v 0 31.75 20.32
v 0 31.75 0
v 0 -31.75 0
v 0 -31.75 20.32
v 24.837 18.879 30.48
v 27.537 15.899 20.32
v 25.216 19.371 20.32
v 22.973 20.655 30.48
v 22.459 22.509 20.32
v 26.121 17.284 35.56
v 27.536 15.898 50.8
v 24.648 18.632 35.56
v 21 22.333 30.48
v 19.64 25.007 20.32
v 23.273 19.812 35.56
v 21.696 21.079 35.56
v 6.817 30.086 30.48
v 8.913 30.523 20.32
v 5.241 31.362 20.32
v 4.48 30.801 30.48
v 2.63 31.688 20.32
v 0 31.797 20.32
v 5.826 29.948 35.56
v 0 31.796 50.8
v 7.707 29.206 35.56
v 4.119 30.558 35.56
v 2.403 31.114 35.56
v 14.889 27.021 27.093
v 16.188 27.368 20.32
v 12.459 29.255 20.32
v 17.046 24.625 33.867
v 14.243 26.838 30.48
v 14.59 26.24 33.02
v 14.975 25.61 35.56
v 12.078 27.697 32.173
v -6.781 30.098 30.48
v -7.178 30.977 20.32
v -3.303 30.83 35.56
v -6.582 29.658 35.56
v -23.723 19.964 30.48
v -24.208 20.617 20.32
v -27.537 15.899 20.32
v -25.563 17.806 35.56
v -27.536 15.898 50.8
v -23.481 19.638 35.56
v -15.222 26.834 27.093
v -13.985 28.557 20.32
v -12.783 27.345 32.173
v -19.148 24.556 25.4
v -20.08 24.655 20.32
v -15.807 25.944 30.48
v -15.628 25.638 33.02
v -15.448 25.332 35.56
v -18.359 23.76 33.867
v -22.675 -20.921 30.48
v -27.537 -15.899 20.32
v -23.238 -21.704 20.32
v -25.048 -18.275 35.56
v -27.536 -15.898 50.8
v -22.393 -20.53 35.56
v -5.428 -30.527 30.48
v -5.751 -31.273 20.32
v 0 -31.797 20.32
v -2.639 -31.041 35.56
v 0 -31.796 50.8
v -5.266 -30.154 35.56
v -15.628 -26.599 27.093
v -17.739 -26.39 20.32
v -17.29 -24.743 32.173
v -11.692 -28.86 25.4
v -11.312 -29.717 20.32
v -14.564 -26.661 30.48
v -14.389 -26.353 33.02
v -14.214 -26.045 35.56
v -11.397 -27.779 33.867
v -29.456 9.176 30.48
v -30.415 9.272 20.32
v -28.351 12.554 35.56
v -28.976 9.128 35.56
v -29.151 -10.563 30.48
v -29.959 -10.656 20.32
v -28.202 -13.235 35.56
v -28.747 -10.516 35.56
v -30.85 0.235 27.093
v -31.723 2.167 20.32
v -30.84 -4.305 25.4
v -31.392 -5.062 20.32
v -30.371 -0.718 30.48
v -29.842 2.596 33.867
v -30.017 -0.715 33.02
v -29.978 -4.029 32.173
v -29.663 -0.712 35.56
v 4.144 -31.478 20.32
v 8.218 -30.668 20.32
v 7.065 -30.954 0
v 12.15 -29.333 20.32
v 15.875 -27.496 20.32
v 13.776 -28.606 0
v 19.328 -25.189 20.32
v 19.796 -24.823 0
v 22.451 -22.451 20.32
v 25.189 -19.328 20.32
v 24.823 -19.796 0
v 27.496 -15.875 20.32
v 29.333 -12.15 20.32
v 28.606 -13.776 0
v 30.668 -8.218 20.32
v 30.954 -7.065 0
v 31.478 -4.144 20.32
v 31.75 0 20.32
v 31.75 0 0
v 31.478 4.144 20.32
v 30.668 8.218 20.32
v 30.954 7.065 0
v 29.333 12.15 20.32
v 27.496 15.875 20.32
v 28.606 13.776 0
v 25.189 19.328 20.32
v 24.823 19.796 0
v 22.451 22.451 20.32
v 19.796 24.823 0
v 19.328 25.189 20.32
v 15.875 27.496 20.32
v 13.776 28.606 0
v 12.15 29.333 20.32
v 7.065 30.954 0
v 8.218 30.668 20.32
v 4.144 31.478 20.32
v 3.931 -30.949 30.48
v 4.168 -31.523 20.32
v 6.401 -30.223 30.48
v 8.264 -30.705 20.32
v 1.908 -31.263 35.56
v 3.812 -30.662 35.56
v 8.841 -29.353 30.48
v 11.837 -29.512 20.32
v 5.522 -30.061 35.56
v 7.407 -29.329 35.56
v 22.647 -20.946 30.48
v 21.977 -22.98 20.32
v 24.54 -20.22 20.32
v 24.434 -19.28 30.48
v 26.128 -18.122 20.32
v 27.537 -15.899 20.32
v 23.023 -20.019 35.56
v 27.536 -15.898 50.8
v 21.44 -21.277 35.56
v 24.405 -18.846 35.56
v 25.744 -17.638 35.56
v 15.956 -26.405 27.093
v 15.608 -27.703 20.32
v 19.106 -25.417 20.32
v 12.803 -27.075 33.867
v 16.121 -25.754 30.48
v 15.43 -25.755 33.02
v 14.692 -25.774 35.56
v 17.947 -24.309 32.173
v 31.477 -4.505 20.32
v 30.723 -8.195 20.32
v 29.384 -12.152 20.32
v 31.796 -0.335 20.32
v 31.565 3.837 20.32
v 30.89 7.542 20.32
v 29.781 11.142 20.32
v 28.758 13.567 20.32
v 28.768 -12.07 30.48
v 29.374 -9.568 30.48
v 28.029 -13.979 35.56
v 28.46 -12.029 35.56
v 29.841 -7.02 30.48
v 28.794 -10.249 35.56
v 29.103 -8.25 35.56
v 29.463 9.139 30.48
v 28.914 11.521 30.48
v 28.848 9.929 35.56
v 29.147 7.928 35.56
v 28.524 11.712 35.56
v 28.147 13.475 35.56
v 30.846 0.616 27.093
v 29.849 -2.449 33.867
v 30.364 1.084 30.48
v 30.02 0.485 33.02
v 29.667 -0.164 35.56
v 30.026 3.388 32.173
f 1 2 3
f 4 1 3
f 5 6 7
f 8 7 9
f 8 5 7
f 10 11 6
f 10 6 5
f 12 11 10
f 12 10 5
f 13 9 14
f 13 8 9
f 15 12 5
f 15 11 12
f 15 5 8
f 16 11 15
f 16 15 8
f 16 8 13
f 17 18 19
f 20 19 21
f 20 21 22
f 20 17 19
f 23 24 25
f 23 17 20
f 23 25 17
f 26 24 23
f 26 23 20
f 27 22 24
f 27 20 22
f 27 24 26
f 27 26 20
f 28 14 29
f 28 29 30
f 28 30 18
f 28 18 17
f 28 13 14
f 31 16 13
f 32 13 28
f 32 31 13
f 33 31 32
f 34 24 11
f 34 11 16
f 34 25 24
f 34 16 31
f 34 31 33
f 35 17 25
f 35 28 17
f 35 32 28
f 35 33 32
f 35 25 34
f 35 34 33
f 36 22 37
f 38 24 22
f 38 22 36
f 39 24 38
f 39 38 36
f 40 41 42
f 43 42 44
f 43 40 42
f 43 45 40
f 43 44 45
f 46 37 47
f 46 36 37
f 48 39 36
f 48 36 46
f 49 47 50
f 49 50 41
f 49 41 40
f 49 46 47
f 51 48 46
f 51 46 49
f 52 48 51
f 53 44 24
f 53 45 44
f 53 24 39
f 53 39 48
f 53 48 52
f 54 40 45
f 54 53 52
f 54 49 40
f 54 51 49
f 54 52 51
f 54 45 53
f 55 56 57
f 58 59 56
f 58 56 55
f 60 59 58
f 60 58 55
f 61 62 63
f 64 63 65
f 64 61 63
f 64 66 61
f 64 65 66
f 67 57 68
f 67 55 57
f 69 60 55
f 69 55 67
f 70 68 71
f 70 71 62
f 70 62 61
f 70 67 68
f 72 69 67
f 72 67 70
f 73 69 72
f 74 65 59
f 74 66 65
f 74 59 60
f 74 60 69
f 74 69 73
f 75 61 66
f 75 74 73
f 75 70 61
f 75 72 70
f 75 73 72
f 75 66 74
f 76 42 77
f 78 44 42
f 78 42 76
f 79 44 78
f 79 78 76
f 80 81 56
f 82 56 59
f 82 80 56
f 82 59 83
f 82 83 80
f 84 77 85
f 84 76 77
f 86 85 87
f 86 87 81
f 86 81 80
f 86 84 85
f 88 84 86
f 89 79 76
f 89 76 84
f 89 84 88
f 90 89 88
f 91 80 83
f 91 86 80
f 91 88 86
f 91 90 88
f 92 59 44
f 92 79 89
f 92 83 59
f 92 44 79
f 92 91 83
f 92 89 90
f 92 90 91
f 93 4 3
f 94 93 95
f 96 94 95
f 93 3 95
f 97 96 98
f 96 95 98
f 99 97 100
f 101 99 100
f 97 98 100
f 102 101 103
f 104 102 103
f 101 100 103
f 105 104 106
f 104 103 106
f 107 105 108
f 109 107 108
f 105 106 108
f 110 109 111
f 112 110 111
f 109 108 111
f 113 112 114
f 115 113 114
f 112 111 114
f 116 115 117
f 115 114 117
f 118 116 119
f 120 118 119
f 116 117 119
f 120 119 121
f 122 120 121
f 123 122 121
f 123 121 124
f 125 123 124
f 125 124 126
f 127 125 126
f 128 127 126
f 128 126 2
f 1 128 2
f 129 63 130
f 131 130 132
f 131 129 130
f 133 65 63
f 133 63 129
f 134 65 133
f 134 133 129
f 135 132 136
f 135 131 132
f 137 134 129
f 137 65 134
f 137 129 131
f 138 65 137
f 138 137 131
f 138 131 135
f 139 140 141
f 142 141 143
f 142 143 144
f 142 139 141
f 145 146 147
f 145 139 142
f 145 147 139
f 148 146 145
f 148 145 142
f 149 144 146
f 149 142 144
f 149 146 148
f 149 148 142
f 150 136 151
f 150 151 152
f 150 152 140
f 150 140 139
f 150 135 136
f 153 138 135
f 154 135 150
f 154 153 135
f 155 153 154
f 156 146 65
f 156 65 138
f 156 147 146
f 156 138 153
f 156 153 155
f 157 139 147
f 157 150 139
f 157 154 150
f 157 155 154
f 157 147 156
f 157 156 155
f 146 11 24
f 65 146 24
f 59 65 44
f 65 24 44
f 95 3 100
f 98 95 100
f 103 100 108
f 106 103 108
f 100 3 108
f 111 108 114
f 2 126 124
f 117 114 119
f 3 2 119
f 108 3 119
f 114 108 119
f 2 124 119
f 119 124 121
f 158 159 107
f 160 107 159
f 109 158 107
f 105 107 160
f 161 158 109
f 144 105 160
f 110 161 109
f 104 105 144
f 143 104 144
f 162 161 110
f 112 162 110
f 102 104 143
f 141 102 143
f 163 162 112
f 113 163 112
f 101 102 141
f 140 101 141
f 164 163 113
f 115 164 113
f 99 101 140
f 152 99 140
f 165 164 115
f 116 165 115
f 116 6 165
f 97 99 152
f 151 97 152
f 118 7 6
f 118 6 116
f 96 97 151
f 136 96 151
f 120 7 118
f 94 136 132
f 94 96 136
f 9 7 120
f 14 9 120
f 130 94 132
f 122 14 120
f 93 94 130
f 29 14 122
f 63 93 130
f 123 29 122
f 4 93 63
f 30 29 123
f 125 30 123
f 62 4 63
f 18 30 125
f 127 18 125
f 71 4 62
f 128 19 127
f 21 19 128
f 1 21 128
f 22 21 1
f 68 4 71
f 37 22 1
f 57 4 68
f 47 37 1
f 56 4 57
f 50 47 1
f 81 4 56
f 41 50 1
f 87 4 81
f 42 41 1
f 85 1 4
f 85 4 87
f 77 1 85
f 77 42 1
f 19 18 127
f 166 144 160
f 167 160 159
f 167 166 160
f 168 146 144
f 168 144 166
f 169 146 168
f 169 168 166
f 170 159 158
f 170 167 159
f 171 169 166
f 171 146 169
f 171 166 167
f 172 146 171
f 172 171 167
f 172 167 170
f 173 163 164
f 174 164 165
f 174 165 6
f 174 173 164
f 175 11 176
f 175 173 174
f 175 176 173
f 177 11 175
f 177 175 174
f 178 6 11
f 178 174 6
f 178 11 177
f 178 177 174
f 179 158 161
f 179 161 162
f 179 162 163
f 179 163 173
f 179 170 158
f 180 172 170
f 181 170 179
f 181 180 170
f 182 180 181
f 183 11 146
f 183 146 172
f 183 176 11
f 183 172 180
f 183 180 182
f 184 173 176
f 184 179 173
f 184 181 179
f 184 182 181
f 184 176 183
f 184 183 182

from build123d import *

# Parameters (mm, degrees)
F1_DEPTH = 20.32


# Not quite as in the source:
# - the arcs of a loft's sections are written as splines that run evenly, so that the points pair up as in the source's solid
# - a feature names something its author has since deleted; it is built from what else it names


with BuildPart() as f1:
    # F0 (on Top) → F1 (new body)
    with BuildSketch(Plane.XY):
        with BuildLine():
            ThreePointArc((0, -31.75), (31.75, 0), (0, 31.75))
            Line((0, 31.75), (0, -31.75))
        make_face()
    extrude(amount=F1_DEPTH)

    # F4 (on offset) → F6 section 0
    with BuildSketch(Plane.XY.offset(20.32)):
        with BuildLine():
            add(Edge.make_bspline(
                [(0, 31.7974612136), (-1.8499013065, 31.7974612136), (-3.6997740452, 31.63561832), (-7.3433683431, 30.9931543385), (-9.1370336348, 30.5125431721), (-12.6137108486, 29.2471361521), (-14.2966690809, 28.4623598401), (-17.5007921327, 26.6124585335), (-19.0219074714, 25.5473621069), (-21.8561207037, 23.169174829), (-23.169174829, 21.8561207037), (-25.5473621069, 19.0219074714), (-26.6124585335, 17.5007921327), (-27.5374091868, 15.8987306068)],
                knots=[0, 0, 0, 0, 0.1666666667, 0.1666666667, 0.3333333333, 0.3333333333, 0.5, 0.5, 0.6666666667, 0.6666666667, 0.8333333333, 0.8333333333, 1, 1, 1, 1], degree=3))
            add(Edge.make_bspline(
                [(-27.5374091868, 15.8987306068), (-28.4623598401, 14.2966690809), (-29.2471361521, 12.6137108486), (-30.5125431721, 9.1370336348), (-30.9931543385, 7.3433683431), (-31.63561832, 3.6997740452), (-31.7974612136, 1.8499013065), (-31.7974612136, -1.8499013065), (-31.63561832, -3.6997740452), (-30.9931543385, -7.3433683431), (-30.5125431721, -9.1370336348), (-29.2471361521, -12.6137108486), (-28.4623598401, -14.2966690809), (-27.5374091868, -15.8987306068)],
                knots=[0, 0, 0, 0, 0.1666666667, 0.1666666667, 0.3333333333, 0.3333333333, 0.5, 0.5, 0.6666666667, 0.6666666667, 0.8333333333, 0.8333333333, 1, 1, 1, 1], degree=3))
            add(Edge.make_bspline(
                [(-27.5374091868, -15.8987306068), (-26.6124585335, -17.5007921327), (-25.5473621069, -19.0219074714), (-23.169174829, -21.8561207037), (-21.8561207037, -23.169174829), (-19.0219074714, -25.5473621069), (-17.5007921327, -26.6124585335), (-14.2966690809, -28.4623598401), (-12.6137108486, -29.2471361521), (-9.1370336348, -30.5125431721), (-7.3433683431, -30.9931543385), (-3.6997740452, -31.63561832), (-1.8499013065, -31.7974612136), (0, -31.7974612136)],
                knots=[0, 0, 0, 0, 0.1666666667, 0.1666666667, 0.3333333333, 0.3333333333, 0.5, 0.5, 0.6666666667, 0.6666666667, 0.8333333333, 0.8333333333, 1, 1, 1, 1], degree=3))
            add(Edge.make_bspline(
                [(0, -31.7974612136), (1.8499013065, -31.7974612136), (3.6997740452, -31.63561832), (7.3433683431, -30.9931543385), (9.1370336348, -30.5125431721), (12.6137108486, -29.2471361521), (14.2966690809, -28.4623598401), (17.5007921327, -26.6124585335), (19.0219074714, -25.5473621069), (21.8561207037, -23.169174829), (23.169174829, -21.8561207037), (25.5473621069, -19.0219074714), (26.6124585335, -17.5007921327), (27.5374091868, -15.8987306068)],
                knots=[0, 0, 0, 0, 0.1666666667, 0.1666666667, 0.3333333333, 0.3333333333, 0.5, 0.5, 0.6666666667, 0.6666666667, 0.8333333333, 0.8333333333, 1, 1, 1, 1], degree=3))
            add(Edge.make_bspline(
                [(27.5374091868, -15.8987306068), (28.4623598401, -14.2966690809), (29.2471361521, -12.6137108486), (30.5125431721, -9.1370336348), (30.9931543385, -7.3433683431), (31.63561832, -3.6997740452), (31.7974612136, -1.8499013065), (31.7974612136, 1.8499013065), (31.63561832, 3.6997740452), (30.9931543385, 7.3433683431), (30.5125431721, 9.1370336348), (29.2471361521, 12.6137108486), (28.4623598401, 14.2966690809), (27.5374091868, 15.8987306068)],
                knots=[0, 0, 0, 0, 0.1666666667, 0.1666666667, 0.3333333333, 0.3333333333, 0.5, 0.5, 0.6666666667, 0.6666666667, 0.8333333333, 0.8333333333, 1, 1, 1, 1], degree=3))
            add(Edge.make_bspline(
                [(27.5374091868, 15.8987306068), (26.6124585335, 17.5007921327), (25.5473621069, 19.0219074714), (23.169174829, 21.8561207037), (21.8561207037, 23.169174829), (19.0219074714, 25.5473621069), (17.5007921327, 26.6124585335), (14.2966690809, 28.4623598401), (12.6137108486, 29.2471361521), (9.1370336348, 30.5125431721), (7.3433683431, 30.9931543385), (3.6997740452, 31.63561832), (1.8499013065, 31.7974612136), (0, 31.7974612136)],
                knots=[0, 0, 0, 0, 0.1666666667, 0.1666666667, 0.3333333333, 0.3333333333, 0.5, 0.5, 0.6666666667, 0.6666666667, 0.8333333333, 0.8333333333, 1, 1, 1, 1], degree=3))
        make_face()
    # F5 (on offset) → F6 section 1
    with BuildSketch(Plane.XY.offset(50.8)):
        Polygon((27.536238076, 15.8980544657), (0, 31.7961089313), (-27.536238076, 15.8980544657), (-27.536238076, -15.8980544657), (0, -31.7961089313), (27.536238076, -15.8980544657), align=None)
    loft(ruled=True)


solid = f1.part
